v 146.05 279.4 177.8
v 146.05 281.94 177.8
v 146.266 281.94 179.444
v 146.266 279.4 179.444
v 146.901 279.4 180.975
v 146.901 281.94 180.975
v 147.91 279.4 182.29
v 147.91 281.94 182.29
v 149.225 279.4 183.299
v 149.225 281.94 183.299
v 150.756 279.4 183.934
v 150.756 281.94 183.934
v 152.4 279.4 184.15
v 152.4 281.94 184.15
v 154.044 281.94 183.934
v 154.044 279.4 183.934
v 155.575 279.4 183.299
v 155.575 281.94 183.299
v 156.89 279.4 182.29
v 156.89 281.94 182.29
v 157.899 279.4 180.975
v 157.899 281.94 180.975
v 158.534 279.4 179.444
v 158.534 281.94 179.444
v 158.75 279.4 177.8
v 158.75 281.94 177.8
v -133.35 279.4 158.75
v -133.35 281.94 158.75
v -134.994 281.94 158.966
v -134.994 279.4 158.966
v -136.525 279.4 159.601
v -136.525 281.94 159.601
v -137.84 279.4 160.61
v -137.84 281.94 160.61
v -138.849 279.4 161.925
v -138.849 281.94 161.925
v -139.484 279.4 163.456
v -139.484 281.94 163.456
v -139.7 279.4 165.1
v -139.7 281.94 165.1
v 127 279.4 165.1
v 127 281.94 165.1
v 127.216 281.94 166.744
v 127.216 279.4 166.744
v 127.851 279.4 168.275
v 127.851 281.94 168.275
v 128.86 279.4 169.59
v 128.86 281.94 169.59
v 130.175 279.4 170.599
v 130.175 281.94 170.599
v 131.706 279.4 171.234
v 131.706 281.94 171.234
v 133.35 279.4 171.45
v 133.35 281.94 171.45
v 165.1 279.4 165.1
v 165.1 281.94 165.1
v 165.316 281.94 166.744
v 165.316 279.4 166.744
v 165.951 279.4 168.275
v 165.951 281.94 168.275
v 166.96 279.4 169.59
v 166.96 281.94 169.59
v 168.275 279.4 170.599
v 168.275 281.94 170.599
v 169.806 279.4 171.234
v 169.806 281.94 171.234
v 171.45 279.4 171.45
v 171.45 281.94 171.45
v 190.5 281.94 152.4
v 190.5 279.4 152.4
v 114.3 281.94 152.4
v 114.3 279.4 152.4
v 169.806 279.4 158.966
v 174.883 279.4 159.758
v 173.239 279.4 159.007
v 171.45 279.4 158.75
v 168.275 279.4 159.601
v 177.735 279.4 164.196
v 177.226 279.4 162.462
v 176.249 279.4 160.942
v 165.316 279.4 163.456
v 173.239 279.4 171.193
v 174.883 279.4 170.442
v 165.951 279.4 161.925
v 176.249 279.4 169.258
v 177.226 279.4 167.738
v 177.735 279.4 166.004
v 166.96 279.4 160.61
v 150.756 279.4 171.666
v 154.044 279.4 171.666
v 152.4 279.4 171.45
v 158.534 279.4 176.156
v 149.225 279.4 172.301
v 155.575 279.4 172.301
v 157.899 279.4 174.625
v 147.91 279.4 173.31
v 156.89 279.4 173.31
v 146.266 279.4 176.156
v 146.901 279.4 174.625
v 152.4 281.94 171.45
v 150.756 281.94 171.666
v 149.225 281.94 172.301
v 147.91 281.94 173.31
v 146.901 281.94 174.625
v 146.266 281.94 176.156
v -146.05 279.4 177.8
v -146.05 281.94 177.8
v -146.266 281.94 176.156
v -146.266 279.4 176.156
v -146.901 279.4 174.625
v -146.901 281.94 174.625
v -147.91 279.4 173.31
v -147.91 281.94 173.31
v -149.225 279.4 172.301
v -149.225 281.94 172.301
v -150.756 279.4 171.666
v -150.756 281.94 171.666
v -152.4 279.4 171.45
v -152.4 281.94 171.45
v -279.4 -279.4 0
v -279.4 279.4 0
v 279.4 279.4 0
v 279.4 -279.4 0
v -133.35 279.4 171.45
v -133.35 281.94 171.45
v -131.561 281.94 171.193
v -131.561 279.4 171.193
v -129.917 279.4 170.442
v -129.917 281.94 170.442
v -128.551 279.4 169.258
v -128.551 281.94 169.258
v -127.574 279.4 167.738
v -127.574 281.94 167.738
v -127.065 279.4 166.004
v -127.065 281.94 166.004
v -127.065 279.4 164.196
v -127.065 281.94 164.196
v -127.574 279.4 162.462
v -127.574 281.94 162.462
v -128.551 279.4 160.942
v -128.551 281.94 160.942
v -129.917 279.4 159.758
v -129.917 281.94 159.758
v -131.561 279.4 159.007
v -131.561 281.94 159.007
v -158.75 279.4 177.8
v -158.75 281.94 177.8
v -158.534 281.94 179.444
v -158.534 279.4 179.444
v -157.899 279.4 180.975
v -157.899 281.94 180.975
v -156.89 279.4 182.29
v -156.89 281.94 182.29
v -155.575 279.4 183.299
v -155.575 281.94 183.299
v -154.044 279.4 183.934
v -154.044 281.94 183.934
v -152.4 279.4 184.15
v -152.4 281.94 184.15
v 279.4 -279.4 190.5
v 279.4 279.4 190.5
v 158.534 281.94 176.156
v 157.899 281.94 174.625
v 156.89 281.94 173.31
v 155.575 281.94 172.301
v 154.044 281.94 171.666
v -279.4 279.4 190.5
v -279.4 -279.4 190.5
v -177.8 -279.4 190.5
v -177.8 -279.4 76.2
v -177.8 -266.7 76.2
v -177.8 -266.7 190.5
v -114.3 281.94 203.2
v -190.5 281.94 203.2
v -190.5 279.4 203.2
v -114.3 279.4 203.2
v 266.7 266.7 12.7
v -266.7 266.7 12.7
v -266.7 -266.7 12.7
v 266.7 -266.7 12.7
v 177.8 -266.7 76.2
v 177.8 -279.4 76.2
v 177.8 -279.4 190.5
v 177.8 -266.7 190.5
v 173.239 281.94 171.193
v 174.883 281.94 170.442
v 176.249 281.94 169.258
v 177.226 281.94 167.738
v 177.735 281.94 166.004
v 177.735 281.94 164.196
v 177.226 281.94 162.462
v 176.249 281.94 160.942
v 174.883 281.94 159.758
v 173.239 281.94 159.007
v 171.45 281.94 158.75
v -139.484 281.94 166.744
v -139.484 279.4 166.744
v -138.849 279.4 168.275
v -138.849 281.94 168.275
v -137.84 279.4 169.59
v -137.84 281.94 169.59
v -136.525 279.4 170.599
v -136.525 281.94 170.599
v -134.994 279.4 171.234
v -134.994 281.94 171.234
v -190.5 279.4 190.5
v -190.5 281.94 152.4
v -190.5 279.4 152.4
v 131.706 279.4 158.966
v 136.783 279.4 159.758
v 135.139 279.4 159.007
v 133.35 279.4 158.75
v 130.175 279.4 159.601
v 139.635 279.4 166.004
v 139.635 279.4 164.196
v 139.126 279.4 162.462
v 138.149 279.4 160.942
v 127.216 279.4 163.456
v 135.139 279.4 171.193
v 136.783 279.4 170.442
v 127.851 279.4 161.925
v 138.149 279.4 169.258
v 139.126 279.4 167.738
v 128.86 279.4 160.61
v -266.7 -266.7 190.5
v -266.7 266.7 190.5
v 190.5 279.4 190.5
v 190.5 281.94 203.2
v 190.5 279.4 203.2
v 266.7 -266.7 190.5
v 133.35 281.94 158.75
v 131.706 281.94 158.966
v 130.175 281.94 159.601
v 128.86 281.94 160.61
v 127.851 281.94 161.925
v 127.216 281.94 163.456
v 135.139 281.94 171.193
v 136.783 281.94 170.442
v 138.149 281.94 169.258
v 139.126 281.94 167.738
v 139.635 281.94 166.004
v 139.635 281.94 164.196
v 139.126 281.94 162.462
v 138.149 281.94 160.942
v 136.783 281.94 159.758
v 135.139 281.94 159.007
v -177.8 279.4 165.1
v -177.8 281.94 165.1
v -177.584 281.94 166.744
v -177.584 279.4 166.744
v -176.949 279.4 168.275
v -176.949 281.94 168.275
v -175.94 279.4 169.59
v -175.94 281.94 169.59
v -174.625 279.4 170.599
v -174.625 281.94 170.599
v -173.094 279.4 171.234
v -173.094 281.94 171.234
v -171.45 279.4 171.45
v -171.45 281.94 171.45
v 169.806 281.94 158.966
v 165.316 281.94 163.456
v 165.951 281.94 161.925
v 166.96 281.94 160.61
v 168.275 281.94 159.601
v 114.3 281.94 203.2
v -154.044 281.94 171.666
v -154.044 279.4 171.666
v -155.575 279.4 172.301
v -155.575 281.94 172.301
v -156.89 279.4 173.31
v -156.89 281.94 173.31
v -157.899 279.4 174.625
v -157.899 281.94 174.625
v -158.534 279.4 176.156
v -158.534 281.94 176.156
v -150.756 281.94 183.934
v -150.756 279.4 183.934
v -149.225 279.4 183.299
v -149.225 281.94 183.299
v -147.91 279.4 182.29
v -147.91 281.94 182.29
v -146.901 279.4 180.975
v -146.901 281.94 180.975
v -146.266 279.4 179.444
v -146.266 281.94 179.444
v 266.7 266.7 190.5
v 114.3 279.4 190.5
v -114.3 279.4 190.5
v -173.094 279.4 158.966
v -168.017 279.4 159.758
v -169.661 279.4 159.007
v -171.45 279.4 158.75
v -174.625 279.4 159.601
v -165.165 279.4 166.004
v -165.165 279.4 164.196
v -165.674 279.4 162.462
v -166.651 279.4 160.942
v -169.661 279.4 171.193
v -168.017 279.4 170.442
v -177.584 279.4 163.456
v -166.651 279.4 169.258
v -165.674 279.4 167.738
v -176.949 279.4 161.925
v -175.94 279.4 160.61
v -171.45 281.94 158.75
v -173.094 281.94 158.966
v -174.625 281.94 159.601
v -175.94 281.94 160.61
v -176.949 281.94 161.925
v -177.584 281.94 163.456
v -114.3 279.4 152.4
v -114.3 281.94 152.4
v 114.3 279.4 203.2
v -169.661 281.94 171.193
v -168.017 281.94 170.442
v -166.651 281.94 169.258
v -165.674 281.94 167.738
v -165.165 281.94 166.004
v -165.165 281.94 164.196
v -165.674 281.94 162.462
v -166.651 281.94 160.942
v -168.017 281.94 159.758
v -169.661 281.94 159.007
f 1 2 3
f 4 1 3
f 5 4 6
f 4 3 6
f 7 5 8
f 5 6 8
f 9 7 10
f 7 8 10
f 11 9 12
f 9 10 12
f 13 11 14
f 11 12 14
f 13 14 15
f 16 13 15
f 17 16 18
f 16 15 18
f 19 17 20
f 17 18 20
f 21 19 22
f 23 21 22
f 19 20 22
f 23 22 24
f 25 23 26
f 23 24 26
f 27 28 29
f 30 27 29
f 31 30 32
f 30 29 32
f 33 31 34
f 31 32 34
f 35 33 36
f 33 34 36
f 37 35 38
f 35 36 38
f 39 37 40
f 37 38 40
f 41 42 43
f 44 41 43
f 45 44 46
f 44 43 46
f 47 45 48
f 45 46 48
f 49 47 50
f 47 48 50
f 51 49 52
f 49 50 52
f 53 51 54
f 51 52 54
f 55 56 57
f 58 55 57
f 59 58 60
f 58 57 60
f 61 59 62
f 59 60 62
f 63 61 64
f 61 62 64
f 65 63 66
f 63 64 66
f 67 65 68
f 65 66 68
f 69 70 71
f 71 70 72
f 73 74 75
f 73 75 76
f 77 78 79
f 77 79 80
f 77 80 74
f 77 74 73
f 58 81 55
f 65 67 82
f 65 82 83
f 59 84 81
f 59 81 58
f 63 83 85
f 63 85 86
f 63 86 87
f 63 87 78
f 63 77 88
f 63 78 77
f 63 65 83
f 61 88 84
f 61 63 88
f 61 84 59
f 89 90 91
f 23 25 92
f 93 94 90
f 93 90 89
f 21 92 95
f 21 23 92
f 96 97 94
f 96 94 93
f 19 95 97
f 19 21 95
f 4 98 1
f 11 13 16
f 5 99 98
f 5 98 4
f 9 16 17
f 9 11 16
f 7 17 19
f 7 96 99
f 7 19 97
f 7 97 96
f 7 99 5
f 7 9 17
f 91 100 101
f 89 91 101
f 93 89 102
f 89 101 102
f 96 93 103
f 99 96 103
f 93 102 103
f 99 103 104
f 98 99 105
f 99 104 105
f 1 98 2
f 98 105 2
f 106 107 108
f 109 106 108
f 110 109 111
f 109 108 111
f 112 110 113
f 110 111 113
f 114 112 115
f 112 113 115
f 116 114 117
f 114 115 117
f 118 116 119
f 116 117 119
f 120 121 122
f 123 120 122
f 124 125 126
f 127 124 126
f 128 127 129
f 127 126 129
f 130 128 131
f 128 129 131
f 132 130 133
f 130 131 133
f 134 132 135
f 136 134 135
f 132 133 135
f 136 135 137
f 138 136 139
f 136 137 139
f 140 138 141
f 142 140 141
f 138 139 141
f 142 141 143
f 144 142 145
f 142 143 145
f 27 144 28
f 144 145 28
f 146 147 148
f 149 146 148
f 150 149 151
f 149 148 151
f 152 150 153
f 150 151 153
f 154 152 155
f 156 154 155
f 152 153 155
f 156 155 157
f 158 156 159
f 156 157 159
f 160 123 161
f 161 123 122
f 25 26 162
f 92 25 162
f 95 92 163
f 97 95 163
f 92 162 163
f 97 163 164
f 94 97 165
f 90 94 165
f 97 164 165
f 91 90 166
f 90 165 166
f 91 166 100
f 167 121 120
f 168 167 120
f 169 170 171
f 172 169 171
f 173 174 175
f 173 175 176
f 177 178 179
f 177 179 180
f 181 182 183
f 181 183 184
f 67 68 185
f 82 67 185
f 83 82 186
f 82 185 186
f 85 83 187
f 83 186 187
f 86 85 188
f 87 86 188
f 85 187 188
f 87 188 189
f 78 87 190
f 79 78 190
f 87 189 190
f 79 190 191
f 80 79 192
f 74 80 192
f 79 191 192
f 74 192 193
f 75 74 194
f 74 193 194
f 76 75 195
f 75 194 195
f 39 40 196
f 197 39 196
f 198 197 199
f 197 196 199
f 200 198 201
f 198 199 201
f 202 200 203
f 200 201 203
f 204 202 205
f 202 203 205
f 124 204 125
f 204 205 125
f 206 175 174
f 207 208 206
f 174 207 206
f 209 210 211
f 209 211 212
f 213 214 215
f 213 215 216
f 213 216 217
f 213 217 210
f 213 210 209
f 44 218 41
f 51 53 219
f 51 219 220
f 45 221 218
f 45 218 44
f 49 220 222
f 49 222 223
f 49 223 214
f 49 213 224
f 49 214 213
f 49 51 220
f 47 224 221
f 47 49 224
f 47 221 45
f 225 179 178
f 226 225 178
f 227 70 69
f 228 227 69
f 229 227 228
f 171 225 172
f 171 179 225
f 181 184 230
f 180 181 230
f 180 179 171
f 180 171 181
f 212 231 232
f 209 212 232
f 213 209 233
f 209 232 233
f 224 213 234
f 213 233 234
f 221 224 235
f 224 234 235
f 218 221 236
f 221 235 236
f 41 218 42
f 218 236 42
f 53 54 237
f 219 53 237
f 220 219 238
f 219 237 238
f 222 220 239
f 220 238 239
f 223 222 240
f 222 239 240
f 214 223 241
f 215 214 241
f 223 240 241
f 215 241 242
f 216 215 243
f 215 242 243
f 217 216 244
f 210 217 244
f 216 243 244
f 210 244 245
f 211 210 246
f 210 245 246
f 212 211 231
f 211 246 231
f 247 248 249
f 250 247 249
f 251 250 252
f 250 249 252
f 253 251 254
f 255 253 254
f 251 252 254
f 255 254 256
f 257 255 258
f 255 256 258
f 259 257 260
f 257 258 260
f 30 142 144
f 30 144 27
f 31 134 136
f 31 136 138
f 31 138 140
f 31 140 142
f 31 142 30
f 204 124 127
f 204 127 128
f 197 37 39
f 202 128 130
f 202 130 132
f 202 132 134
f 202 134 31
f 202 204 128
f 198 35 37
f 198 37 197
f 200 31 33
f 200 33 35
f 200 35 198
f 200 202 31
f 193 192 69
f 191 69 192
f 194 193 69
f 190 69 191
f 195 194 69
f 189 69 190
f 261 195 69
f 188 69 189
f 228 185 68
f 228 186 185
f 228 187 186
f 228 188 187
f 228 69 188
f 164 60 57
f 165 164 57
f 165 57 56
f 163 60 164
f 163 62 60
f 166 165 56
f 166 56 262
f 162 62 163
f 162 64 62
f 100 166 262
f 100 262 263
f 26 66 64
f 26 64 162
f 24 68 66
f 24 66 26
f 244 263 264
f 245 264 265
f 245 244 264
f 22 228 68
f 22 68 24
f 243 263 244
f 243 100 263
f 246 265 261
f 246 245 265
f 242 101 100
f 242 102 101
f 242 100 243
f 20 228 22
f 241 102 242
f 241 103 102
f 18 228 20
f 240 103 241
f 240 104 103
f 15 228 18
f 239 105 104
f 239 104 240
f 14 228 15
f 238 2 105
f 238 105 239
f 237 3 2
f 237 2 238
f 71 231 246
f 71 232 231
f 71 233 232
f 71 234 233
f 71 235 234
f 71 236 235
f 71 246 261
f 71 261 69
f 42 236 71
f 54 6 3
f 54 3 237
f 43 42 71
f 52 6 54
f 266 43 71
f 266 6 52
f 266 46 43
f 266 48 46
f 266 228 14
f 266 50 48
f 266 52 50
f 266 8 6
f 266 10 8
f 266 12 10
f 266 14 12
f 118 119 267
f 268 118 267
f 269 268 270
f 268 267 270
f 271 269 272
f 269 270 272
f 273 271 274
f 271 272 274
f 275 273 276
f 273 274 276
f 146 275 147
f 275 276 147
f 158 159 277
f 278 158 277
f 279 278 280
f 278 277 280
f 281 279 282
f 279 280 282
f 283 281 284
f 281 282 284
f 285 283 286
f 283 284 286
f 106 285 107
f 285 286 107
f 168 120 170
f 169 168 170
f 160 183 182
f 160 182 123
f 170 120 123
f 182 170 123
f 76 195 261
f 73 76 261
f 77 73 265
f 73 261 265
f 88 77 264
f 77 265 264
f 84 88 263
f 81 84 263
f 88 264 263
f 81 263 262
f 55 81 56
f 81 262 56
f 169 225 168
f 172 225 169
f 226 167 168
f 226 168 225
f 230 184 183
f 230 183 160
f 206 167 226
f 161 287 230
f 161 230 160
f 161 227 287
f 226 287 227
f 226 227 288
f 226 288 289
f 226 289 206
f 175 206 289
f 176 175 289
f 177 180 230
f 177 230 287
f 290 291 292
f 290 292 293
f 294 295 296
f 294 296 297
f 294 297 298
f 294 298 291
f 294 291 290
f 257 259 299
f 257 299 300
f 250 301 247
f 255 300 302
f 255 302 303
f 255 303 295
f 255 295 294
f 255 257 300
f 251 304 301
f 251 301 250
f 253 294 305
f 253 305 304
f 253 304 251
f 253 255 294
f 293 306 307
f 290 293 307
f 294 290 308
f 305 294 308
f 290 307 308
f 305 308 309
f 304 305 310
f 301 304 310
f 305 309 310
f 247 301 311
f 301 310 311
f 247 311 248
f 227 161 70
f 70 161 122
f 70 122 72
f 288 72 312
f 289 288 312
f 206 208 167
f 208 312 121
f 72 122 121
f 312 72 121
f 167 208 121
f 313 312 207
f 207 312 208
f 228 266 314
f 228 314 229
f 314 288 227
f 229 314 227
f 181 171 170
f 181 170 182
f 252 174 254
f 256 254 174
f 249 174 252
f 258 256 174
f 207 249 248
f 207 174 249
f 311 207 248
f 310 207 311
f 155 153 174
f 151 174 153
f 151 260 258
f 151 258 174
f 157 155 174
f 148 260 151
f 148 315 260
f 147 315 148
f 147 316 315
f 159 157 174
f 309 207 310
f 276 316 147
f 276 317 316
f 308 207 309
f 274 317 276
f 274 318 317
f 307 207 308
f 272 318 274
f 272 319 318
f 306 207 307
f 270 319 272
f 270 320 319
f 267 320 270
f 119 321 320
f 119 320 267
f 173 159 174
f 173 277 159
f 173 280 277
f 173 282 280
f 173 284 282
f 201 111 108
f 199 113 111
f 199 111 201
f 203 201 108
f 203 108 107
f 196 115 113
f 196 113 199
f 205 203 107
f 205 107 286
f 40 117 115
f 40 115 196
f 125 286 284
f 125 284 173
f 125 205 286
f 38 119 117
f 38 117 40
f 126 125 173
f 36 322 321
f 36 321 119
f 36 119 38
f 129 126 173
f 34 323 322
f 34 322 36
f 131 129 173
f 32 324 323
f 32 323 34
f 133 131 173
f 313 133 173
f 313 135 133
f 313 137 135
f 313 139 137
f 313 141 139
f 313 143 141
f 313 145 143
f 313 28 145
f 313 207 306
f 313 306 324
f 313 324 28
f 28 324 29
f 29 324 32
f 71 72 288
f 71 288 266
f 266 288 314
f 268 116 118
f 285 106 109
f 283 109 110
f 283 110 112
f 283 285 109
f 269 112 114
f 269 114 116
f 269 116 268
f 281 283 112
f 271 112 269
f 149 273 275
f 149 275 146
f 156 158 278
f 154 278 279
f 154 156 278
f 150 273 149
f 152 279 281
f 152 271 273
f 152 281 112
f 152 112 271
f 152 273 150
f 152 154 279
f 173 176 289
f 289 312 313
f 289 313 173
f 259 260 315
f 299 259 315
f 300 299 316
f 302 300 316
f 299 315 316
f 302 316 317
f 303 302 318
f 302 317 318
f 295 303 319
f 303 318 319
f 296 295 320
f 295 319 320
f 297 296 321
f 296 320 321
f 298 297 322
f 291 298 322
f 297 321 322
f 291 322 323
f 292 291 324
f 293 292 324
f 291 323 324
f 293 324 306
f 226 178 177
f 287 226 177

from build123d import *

# Parameters (mm, degrees)
F0_W      = 558.8
F0_H      = 558.8
F1_DEPTH  = 12.7
F2_W      = 12.7
F2_H      = 546.1
F3_DEPTH  = 177.8
F4_W      = 533.4
F4_H      = 12.7
F5_DEPTH  = 63.5
F6_W      = 88.9
F6_H      = 12.7
F7_DEPTH  = 114.3
F8_W      = 76.2
F8_H      = 38.1
F9_DEPTH  = 2.54
F10_W     = 76.2
F10_H     = 2.54
F11_DEPTH = 12.7
F13_DEPTH = 2.54
F15_DEPTH = 2.54


with BuildPart() as f1:
    # F0 (on Top) → F1 (new body)
    with BuildSketch(Plane.XY):
        Rectangle(F0_W, F0_H)
    extrude(amount=F1_DEPTH)

    # F2 (on face) → F3 (join)
    with BuildSketch(Plane.XY.offset(12.7)):
        with Locations((-273.05, -6.35)):
            Rectangle(F2_W, F2_H)
        Polygon((279.4, 279.4), (-279.4, 279.4), (-279.4, 266.7), (-266.7, 266.7), (266.7, 266.7), (279.4, 266.7), align=None)
        with Locations((273.05, -6.35)):
            Rectangle(F2_W, F2_H)
    extrude(amount=F3_DEPTH)

    # F4 (on face) → F5 (join)
    with BuildSketch(Plane.XY.offset(12.7)):
        with Locations((0, -273.05)):
            Rectangle(F4_W, F4_H)
    extrude(amount=F5_DEPTH)

    # F6 (on face) → F7 (join)
    with BuildSketch(Plane.XY.offset(76.2)):
        with Locations((-222.25, -273.05)):
            Rectangle(F6_W, F6_H)
        with Locations((222.25, -273.05)):
            Rectangle(F6_W, F6_H)
    extrude(amount=F7_DEPTH)

    # F8 (on face) → F9 (join)
    with BuildSketch(Plane(origin=(0, 279.4, 0), x_dir=(-1, 0, 0), z_dir=(0, 1, 0))):
        with Locations((-152.4, 171.45)):
            Rectangle(F8_W, F8_H)
        with Locations((152.4, 171.45)):
            Rectangle(F8_W, F8_H)
    extrude(amount=F9_DEPTH)

    # F10 (on face) → F11 (join)
    with BuildSketch(Plane.XY.offset(190.5)):
        with Locations((-152.4, 280.67)):
            Rectangle(F10_W, F10_H)
        with Locations((152.4, 280.67)):
            Rectangle(F10_W, F10_H)
    extrude(amount=F11_DEPTH)

    # F12 (on face) → F13 (cut)
    with BuildSketch(Plane(origin=(0, 281.94, 0), x_dir=(-1, 0, 0), z_dir=(0, 1, 0))):
        with BuildLine():
            Line((-171.45, 158.75), (-171.45, 171.45))
            ThreePointArc((-171.45, 171.45), (-177.8, 165.1), (-171.45, 158.75))
        make_face()
        with BuildLine():
            ThreePointArc((-165.1, 165.1), (-166.9598719395, 169.5901280605), (-171.45, 171.45))
            Line((-171.45, 171.45), (-171.45, 158.75))
            ThreePointArc((-171.45, 158.75), (-166.9598719395, 160.6098719395), (-165.1, 165.1))
        make_face()
        with BuildLine():
            ThreePointArc((-152.4, 184.15), (-156.8901280605, 182.2901280605), (-158.75, 177.8))
            Line((-158.75, 177.8), (-152.4, 177.8))
            Line((-152.4, 177.8), (-152.4, 184.15))
        make_face()
        with BuildLine():
            Line((-152.4, 177.8), (-158.75, 177.8))
            ThreePointArc((-158.75, 177.8), (-156.8901280605, 173.3098719395), (-152.4, 171.45))
            Line((-152.4, 171.45), (-152.4, 177.8))
        make_face()
        with BuildLine():
            Line((-146.05, 177.8), (-152.4, 177.8))
            Line((-152.4, 177.8), (-152.4, 171.45))
            ThreePointArc((-152.4, 171.45), (-147.9098719395, 173.3098719395), (-146.05, 177.8))
        make_face()
        with BuildLine():
            Line((-152.4, 184.15), (-152.4, 177.8))
            Line((-152.4, 177.8), (-146.05, 177.8))
            ThreePointArc((-146.05, 177.8), (-147.9098719395, 182.2901280605), (-152.4, 184.15))
        make_face()
        with BuildLine():
            ThreePointArc((-133.35, 171.45), (-139.7, 165.1), (-133.35, 158.75))
            Line((-133.35, 158.75), (-133.35, 171.45))
        make_face()
        with BuildLine():
            Line((-133.35, 171.45), (-133.35, 158.75))
            ThreePointArc((-133.35, 158.75), (-128.8598719395, 160.6098719395), (-127, 165.1))
            ThreePointArc((-127, 165.1), (-128.8598719395, 169.5901280605), (-133.35, 171.45))
        make_face()
    extrude(amount=-F13_DEPTH, mode=Mode.SUBTRACT)

    # F14 (on face) → F15 (cut)
    with BuildSketch(Plane(origin=(0, 281.94, 0), x_dir=(-1, 0, 0), z_dir=(0, 1, 0))):
        with BuildLine():
            Line((152.4, 184.15), (152.4, 177.8))
            Line((152.4, 177.8), (158.75, 177.8))
            ThreePointArc((158.75, 177.8), (156.8901280605, 182.2901280605), (152.4, 184.15))
        make_face()
        with BuildLine():
            ThreePointArc((152.4, 184.15), (147.9098719395, 182.2901280605), (146.05, 177.8))
            Line((146.05, 177.8), (152.4, 177.8))
            Line((152.4, 177.8), (152.4, 184.15))
        make_face()
        with BuildLine():
            Line((152.4, 177.8), (146.05, 177.8))
            ThreePointArc((146.05, 177.8), (147.9098719395, 173.3098719395), (152.4, 171.45))
            Line((152.4, 171.45), (152.4, 177.8))
        make_face()
        with BuildLine():
            Line((158.75, 177.8), (152.4, 177.8))
            Line((152.4, 177.8), (152.4, 171.45))
            ThreePointArc((152.4, 171.45), (156.8901280605, 173.3098719395), (158.75, 177.8))
        make_face()
        with BuildLine():
            ThreePointArc((139.7, 165.1), (137.8401280605, 169.5901280605), (133.35, 171.45))
            Line((133.35, 171.45), (133.35, 158.75))
            ThreePointArc((133.35, 158.75), (137.8401280605, 160.6098719395), (139.7, 165.1))
        make_face()
        with BuildLine():
            Line((133.35, 158.75), (133.35, 171.45))
            ThreePointArc((133.35, 171.45), (127, 165.1), (133.35, 158.75))
        make_face()
        with BuildLine():
            ThreePointArc((171.45, 171.45), (165.1, 165.1), (171.45, 158.75))
            Line((171.45, 158.75), (171.45, 171.45))
        make_face()
        with BuildLine():
            Line((171.45, 171.45), (171.45, 158.75))
            ThreePointArc((171.45, 158.75), (175.9401280605, 160.6098719395), (177.8, 165.1))
            ThreePointArc((177.8, 165.1), (175.9401280605, 169.5901280605), (171.45, 171.45))
        make_face()
    extrude(amount=-F15_DEPTH, mode=Mode.SUBTRACT)


solid = f1.part
